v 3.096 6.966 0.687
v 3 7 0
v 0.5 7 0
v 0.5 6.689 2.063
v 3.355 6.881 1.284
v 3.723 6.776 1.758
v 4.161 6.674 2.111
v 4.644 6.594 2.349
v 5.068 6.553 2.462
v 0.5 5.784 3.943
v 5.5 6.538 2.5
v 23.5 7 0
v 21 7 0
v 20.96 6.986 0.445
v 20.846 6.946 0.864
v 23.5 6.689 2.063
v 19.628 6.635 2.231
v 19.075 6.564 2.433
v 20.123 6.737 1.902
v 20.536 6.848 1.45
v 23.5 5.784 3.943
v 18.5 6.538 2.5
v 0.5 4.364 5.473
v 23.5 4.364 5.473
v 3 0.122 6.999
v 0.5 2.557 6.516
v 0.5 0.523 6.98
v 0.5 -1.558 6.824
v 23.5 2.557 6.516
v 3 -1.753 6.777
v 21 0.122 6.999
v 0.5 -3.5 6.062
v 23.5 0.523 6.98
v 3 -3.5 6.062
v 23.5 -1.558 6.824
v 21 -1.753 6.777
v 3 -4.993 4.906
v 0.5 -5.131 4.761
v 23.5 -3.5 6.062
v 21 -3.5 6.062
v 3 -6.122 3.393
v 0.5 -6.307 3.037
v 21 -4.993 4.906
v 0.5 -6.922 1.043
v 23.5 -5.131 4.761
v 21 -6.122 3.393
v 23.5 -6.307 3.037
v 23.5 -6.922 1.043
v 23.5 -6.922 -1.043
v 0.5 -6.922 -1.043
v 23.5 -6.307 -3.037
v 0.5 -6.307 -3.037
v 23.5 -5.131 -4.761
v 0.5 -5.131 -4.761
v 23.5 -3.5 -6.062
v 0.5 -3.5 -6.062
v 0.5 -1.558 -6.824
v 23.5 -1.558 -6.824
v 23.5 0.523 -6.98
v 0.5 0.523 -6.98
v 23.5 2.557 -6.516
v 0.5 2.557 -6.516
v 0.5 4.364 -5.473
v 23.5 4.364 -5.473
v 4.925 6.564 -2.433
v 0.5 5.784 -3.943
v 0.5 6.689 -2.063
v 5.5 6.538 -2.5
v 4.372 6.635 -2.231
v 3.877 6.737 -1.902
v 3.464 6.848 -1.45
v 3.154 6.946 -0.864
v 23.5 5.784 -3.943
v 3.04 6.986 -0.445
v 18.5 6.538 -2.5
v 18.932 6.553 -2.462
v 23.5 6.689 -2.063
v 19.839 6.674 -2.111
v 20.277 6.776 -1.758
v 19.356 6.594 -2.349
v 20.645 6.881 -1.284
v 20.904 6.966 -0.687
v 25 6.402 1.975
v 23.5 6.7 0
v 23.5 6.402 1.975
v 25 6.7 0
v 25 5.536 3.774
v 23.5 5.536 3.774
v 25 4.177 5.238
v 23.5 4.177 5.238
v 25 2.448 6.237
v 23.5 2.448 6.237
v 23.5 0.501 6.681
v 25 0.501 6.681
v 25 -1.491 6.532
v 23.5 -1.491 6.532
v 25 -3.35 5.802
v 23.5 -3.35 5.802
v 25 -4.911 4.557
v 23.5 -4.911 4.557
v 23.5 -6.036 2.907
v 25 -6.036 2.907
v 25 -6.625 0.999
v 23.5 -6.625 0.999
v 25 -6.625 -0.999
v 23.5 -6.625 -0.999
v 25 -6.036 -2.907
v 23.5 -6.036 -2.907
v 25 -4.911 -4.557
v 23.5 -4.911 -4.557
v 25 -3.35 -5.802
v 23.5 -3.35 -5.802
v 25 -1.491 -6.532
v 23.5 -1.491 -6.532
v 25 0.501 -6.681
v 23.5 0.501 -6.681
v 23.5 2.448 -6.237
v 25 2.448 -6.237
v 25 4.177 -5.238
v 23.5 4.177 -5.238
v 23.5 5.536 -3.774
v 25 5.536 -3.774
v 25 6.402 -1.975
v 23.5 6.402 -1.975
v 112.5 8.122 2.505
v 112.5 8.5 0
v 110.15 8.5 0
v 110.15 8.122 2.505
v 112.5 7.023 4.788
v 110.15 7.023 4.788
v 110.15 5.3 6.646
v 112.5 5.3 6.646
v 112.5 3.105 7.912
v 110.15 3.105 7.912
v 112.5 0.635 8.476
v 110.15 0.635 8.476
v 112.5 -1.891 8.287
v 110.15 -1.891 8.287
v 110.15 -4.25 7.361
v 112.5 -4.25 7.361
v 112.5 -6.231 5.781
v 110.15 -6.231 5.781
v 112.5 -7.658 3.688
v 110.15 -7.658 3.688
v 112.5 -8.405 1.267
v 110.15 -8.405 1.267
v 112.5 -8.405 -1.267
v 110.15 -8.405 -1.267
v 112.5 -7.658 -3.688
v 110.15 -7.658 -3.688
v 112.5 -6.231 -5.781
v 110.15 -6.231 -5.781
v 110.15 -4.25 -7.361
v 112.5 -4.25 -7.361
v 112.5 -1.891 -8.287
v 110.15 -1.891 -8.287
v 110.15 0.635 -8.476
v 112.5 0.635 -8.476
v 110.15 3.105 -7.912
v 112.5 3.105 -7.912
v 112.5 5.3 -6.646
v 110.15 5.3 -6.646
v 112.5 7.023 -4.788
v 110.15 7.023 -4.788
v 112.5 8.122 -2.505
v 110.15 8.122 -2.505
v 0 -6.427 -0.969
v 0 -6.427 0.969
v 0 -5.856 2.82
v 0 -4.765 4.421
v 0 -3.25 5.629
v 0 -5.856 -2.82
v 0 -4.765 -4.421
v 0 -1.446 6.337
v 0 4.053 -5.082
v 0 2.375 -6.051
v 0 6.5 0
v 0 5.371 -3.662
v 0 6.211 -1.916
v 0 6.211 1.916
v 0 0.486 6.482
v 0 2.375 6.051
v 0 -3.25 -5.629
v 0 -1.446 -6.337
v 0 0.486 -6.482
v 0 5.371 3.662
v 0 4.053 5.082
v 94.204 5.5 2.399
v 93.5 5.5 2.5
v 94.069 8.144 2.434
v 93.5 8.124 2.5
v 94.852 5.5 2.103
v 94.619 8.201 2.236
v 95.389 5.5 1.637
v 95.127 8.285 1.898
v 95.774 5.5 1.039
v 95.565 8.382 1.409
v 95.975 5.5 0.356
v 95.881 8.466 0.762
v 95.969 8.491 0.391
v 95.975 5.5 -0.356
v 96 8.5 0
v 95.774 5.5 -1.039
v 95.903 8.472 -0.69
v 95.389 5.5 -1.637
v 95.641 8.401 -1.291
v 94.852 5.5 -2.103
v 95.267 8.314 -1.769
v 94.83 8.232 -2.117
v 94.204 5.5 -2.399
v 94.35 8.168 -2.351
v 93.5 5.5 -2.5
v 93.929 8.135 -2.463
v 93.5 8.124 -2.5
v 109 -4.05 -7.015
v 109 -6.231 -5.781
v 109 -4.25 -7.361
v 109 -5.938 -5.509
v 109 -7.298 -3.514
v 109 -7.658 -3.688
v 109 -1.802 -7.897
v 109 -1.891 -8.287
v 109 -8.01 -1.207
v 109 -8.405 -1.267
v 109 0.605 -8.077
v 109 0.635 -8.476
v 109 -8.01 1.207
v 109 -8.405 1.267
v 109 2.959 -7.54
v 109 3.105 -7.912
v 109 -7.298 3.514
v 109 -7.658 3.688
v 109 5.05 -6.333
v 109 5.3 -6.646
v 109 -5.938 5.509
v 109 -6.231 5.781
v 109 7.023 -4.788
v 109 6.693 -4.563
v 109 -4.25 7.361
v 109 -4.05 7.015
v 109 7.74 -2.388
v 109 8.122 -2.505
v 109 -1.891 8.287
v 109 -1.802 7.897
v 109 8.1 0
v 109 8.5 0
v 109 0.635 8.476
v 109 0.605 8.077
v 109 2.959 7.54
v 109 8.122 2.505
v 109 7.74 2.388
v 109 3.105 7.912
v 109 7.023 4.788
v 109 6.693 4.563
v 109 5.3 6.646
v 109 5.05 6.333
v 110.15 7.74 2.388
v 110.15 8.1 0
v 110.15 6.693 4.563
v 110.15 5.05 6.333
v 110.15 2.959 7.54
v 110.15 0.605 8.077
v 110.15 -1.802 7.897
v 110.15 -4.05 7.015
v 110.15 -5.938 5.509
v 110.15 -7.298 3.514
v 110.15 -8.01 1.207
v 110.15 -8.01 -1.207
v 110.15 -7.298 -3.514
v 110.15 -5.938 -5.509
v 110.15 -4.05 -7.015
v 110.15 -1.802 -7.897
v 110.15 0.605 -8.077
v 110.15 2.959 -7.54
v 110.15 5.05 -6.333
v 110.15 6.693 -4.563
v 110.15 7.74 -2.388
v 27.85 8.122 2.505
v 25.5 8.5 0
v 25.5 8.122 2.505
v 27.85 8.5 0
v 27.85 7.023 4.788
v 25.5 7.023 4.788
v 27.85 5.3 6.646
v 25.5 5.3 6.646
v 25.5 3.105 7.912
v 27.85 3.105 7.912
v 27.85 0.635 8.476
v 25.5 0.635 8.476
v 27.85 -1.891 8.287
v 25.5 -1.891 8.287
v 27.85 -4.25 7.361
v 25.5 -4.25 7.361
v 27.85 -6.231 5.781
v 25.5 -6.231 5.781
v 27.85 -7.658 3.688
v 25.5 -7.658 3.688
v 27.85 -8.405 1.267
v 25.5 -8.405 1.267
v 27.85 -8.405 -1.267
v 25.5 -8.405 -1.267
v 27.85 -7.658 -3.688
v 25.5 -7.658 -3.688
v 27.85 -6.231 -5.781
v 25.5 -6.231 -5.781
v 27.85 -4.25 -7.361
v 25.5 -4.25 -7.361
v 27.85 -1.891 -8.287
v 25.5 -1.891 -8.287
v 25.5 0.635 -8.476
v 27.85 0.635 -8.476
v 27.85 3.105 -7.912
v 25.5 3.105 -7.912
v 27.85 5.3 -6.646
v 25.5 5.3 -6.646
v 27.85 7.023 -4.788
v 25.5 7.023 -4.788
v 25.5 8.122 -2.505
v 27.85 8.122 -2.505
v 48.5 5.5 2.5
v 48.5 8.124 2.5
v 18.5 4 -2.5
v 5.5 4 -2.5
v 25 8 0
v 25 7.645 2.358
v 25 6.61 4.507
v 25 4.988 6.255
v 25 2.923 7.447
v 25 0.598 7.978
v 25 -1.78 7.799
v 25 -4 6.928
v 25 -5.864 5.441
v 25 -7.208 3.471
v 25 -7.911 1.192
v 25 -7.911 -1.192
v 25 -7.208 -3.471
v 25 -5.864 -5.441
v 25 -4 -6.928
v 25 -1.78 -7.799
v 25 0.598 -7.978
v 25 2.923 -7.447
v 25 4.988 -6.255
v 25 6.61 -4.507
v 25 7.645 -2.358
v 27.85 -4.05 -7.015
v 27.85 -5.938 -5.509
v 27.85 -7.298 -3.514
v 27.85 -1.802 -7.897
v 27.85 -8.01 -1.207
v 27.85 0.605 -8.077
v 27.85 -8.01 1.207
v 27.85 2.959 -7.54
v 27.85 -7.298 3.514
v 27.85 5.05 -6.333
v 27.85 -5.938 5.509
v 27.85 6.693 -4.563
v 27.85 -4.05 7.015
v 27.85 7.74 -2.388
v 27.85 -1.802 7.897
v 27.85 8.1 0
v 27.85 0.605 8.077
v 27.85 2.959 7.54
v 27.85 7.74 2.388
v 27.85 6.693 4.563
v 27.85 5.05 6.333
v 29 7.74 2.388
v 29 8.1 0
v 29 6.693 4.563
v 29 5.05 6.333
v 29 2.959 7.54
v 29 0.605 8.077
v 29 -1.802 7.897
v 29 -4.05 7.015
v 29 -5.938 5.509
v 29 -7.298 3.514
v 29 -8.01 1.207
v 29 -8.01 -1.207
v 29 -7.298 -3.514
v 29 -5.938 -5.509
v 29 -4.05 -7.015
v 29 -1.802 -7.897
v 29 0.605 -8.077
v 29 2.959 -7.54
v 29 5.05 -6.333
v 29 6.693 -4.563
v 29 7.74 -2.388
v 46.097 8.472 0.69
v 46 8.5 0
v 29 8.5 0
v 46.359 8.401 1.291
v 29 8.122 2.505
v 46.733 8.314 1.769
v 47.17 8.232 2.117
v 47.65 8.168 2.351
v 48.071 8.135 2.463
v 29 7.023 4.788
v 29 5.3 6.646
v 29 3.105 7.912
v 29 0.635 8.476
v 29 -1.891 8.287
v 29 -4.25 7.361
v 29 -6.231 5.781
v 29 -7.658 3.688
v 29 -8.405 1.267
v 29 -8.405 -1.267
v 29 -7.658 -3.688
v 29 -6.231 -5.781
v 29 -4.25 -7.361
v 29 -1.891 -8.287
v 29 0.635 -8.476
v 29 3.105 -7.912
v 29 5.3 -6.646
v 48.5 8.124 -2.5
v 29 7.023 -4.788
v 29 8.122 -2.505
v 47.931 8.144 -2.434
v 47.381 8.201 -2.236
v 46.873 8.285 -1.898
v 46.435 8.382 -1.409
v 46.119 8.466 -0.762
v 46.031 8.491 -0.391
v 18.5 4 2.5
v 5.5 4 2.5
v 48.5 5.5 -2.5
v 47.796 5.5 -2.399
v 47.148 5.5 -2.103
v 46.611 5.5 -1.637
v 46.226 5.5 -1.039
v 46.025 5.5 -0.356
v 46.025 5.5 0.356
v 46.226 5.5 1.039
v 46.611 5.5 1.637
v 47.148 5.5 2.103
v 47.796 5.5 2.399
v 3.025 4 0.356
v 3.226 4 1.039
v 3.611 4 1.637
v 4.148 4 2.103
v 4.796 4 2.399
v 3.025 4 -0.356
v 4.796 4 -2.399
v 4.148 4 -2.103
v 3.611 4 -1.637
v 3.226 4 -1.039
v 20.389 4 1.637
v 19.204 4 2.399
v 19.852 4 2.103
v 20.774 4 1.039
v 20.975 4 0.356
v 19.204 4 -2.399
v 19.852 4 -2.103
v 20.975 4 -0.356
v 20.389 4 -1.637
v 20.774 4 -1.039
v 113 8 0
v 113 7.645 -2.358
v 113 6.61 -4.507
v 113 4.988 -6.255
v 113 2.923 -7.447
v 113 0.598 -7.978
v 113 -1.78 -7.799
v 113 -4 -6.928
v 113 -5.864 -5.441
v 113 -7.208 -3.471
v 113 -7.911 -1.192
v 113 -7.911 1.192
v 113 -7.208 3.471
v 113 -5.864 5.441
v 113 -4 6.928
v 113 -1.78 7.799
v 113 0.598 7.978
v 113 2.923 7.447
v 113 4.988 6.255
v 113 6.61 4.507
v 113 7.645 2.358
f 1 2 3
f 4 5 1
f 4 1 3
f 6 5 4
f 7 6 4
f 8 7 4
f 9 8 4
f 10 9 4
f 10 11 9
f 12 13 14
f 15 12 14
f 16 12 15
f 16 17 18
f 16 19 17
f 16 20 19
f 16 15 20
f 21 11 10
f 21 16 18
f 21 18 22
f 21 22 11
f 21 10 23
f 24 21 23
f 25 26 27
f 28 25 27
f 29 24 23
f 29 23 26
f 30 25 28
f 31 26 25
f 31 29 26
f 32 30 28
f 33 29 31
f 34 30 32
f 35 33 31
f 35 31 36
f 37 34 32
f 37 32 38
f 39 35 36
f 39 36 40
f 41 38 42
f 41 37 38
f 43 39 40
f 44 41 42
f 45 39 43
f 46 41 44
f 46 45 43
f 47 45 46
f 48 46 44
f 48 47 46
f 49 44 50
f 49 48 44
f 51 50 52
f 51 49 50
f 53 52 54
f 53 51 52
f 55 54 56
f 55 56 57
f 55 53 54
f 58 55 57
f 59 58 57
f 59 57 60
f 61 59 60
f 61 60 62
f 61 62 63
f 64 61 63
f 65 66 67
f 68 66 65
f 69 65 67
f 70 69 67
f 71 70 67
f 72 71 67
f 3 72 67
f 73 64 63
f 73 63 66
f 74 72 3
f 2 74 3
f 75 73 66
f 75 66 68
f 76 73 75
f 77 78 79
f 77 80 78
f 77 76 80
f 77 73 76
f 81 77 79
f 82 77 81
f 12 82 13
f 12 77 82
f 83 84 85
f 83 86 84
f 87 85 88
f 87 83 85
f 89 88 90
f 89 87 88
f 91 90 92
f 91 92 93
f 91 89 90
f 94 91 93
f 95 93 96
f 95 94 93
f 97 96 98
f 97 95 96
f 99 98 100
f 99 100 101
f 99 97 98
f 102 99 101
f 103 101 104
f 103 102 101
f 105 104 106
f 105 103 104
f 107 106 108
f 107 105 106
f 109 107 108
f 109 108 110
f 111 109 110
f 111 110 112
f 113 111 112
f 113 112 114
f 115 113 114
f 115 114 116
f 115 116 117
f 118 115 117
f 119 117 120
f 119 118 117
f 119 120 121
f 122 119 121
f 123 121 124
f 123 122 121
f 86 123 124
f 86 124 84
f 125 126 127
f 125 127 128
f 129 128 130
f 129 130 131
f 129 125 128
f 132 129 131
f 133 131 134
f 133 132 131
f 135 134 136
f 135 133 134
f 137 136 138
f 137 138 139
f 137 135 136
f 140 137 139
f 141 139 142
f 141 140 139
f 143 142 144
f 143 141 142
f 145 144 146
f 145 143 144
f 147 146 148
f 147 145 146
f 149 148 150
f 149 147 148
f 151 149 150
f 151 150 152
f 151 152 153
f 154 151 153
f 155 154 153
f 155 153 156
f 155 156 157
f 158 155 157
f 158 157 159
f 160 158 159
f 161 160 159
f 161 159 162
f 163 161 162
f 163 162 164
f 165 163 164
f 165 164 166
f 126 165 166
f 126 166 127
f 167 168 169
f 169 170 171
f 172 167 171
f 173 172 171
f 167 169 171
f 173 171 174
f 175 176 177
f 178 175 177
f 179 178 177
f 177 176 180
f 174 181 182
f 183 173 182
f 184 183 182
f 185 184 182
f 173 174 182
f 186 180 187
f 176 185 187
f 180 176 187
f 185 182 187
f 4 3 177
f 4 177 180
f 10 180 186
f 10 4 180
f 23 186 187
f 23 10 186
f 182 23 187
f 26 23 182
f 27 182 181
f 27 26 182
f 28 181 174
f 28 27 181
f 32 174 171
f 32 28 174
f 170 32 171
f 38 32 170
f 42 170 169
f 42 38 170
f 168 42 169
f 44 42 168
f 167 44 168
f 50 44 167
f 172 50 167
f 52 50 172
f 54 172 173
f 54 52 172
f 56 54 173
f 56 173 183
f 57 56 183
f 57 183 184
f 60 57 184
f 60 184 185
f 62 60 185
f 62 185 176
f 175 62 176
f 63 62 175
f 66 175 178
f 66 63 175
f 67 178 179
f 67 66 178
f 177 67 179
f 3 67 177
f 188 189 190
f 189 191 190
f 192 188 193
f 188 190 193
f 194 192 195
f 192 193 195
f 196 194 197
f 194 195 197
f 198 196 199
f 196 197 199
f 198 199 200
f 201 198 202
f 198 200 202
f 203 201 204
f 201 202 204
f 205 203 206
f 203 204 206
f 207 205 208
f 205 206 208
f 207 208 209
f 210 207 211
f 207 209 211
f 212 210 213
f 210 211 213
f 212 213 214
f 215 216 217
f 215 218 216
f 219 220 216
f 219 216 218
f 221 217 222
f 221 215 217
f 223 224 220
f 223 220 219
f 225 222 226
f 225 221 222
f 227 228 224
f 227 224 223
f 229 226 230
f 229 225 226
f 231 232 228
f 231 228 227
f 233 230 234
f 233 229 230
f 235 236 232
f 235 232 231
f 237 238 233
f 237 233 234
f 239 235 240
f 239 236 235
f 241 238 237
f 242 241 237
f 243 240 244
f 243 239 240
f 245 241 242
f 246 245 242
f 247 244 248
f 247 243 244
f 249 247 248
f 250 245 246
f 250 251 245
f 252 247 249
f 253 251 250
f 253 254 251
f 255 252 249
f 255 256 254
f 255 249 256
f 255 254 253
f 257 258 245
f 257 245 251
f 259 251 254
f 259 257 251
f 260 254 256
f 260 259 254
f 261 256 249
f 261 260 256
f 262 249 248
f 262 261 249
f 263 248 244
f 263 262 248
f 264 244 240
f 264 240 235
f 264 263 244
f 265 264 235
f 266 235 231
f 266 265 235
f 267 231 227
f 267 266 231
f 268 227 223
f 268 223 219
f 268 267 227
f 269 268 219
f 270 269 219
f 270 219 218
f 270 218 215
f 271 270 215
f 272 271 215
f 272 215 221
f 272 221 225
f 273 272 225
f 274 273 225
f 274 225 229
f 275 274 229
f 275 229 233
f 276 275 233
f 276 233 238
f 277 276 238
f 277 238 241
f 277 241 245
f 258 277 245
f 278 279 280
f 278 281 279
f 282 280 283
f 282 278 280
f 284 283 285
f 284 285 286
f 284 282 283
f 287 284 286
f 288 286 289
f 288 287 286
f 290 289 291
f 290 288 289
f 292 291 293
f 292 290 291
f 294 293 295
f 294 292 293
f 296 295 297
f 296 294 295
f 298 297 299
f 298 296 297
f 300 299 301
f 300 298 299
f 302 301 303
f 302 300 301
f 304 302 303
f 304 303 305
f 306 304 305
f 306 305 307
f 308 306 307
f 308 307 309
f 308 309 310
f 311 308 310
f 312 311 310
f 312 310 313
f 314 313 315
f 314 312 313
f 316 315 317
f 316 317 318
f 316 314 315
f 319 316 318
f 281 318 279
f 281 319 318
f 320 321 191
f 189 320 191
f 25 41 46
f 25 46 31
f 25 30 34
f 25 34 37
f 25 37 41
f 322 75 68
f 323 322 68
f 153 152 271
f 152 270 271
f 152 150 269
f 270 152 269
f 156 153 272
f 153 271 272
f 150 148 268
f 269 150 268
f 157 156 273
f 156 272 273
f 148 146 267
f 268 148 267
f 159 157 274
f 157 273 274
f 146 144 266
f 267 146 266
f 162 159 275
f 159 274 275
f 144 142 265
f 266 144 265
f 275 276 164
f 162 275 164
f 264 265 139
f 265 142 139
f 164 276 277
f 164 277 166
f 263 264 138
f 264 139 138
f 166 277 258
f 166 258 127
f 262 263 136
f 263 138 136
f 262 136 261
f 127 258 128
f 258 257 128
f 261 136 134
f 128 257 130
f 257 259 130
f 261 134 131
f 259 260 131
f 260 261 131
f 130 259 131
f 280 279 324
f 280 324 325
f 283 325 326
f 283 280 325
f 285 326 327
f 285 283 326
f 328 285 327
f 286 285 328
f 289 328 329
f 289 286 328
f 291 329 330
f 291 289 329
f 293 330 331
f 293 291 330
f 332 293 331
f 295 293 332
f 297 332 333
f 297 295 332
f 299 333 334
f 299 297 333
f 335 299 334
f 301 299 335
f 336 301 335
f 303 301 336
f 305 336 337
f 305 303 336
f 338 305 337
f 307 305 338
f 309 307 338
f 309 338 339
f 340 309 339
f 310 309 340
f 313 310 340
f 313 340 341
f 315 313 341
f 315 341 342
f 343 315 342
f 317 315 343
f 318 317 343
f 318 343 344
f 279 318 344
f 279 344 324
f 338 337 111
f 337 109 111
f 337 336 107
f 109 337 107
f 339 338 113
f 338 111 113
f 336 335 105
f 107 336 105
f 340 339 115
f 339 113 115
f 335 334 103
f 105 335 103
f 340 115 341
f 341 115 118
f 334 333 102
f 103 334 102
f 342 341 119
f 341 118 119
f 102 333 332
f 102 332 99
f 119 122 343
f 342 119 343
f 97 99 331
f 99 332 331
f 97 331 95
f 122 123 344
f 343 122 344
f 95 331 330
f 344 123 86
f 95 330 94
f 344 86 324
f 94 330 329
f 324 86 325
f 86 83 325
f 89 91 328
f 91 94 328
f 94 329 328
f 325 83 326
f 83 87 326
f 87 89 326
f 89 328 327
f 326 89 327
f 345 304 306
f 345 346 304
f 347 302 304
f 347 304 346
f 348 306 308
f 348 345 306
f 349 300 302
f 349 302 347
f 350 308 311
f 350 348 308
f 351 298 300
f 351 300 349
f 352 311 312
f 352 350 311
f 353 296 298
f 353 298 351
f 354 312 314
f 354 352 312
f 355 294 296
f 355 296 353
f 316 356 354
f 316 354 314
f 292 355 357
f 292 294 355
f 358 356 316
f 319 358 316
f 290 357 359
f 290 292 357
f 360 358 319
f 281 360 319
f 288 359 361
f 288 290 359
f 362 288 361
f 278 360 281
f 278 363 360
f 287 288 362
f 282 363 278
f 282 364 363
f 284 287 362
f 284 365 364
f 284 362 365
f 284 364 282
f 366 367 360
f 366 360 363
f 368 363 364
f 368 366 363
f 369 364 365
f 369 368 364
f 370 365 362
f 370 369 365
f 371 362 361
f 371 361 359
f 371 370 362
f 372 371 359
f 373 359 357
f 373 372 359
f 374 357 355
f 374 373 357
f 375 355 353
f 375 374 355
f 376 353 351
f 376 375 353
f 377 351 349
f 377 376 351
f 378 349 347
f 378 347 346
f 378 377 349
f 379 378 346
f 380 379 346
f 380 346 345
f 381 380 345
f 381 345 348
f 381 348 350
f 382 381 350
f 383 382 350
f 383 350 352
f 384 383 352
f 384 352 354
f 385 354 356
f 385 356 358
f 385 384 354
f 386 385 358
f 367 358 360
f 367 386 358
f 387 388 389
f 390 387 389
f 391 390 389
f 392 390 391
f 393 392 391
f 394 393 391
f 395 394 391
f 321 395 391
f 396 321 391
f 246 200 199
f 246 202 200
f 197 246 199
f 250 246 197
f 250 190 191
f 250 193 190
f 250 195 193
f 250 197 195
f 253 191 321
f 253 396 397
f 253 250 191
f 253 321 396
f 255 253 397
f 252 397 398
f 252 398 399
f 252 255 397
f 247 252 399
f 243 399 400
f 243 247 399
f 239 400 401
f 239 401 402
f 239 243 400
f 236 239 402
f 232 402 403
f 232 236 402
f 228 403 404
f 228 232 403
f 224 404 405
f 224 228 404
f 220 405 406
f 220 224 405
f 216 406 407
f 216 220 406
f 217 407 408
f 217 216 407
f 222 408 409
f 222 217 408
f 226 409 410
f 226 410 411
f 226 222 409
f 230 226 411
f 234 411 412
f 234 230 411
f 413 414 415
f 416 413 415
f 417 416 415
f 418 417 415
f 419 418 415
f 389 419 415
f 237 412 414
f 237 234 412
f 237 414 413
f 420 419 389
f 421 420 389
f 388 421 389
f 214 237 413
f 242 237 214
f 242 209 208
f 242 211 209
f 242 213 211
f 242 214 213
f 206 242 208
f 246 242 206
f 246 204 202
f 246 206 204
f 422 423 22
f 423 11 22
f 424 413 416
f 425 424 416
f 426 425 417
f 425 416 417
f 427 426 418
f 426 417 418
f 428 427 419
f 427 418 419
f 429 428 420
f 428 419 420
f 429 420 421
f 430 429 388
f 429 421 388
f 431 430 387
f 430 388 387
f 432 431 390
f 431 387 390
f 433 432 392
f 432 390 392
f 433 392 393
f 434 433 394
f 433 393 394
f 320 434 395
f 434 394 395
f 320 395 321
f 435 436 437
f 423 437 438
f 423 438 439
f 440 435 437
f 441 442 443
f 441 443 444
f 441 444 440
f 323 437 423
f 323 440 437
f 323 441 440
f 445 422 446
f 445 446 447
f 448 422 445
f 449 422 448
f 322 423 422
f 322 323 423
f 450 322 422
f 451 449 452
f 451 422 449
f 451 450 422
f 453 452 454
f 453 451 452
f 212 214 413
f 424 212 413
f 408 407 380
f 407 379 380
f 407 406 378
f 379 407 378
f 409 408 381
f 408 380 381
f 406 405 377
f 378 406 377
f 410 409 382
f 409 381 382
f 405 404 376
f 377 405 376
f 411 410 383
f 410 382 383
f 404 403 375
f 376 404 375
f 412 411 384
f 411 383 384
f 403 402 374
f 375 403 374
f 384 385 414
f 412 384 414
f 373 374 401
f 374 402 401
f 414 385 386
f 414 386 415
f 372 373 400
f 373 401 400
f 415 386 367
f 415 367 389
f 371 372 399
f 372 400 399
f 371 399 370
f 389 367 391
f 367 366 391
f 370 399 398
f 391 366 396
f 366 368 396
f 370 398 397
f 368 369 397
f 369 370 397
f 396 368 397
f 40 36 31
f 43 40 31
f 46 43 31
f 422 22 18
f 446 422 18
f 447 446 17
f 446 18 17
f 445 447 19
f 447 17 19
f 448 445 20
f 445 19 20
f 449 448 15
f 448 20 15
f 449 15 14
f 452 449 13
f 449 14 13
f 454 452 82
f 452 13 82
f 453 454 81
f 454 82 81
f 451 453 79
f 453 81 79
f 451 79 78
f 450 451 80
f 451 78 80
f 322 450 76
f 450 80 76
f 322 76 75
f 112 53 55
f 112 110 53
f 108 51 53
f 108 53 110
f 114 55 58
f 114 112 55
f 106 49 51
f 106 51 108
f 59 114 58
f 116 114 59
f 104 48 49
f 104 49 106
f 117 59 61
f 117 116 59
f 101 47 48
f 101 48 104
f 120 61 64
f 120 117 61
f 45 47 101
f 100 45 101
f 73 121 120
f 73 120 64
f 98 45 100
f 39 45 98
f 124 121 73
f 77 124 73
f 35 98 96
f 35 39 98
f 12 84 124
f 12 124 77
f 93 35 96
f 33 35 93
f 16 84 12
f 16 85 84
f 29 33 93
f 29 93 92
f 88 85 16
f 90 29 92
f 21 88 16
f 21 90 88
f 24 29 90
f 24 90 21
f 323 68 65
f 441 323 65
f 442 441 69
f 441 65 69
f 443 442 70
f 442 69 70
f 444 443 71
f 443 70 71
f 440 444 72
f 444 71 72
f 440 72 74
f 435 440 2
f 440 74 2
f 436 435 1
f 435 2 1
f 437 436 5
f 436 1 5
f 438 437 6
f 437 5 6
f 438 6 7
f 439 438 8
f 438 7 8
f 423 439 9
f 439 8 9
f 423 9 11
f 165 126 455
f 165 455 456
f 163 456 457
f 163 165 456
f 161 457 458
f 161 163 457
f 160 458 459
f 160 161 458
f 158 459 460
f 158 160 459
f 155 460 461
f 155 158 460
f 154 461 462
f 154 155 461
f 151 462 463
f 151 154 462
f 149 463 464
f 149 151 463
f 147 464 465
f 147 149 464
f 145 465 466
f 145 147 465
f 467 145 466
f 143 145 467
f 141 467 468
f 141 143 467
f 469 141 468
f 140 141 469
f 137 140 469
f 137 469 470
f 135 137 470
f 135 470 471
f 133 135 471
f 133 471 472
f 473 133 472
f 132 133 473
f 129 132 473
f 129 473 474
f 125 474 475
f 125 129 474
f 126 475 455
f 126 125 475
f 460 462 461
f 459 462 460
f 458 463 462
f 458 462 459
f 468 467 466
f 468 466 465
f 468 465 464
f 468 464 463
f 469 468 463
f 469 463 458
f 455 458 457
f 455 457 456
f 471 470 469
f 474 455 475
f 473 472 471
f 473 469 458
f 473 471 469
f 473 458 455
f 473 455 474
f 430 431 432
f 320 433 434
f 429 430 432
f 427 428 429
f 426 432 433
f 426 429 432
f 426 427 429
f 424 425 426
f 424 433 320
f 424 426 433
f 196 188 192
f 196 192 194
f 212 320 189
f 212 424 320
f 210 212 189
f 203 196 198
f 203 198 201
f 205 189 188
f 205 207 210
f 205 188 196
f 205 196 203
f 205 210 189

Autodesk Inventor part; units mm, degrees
sketch "Sketch_1" plane through (0, 0, 0) normal (0, 0, 1) x (1, 0, 0)
  line L0 (113, 0) -> (0, 0)
  line L1 (0, 0) -> (0, 6.5)
  line L2 (0, 6.5) -> (0.5, 7)
  line L3 (0.5, 7) -> (25, 7)
  line L4 (25, 7) -> (25, 8)
  line L5 (25, 8) -> (25.5, 8.5)
  line L6 (25.5, 8.5) -> (112.5, 8.5)
  line L7 (112.5, 8.5) -> (113, 8)
  line L8 (113, 8) -> (113, 0)
  line L9 (113, 0) -> (0, 0)
revolve "Revolution1" add sketch "Sketch_1" angle 360 about axis through (113, 0, 0) along (1, 0, 0)
sketch "Sketch_2" plane through (0, 0, 0) normal (0, 0, 1) x (1, 0, 0)
  line L0 (50, 0) -> (-50, 0)
  line L1 (23.5, 21) -> (23.5, 6.7)
  line L2 (23.5, 6.7) -> (25, 6.7)
  line L3 (25, 6.7) -> (25, 21)
  line L4 (25, 21) -> (23.5, 21)
revolve "Revolution2" cut sketch "Sketch_2" angle 360 about axis through (50, 0, 0) along (1, 0, 0)
sketch "Sketch_15" plane through (0, 0, 0) normal (0, 0, 1) x (1, 0, 0)
  line L0 (50, 0) -> (-50, 0)
  line L1 (27.85, 25.1) -> (27.85, 8.1)
  line L2 (27.85, 8.1) -> (29, 8.1)
  line L3 (29, 8.1) -> (29, 25.1)
  line L4 (29, 25.1) -> (27.85, 25.1)
revolve "Revolution3" cut sketch "Sketch_15" angle 360 about axis through (50, 0, 0) along (1, 0, 0)
sketch "Sketch_16" plane through (0, 0, 0) normal (0, 0, 1) x (1, 0, 0)
  line L0 (113, 0) -> (-50, 0)
  line L1 (109, 25.1) -> (109, 8.1)
  line L2 (109, 8.1) -> (110.15, 8.1)
  line L3 (110.15, 8.1) -> (110.15, 25.1)
  line L4 (110.15, 25.1) -> (109, 25.1)
revolve "Revolution4" cut sketch "Sketch_16" angle 360 about axis through (113, 0, 0) along (1, 0, 0)
sketch "Sketch_20" plane through (0, 8.5, 0) normal (0, 1, 0) x (1, 0, 0)
  arc A0 (48.5, 2.5) -> (48.5, -2.5) centre (48.5, 0) ccw
  line L0 (48.5, -2.5) -> (93.5, -2.5)
  arc A1 (93.5, -2.5) -> (93.5, 2.5) centre (93.5, 0) ccw
  line L1 (93.5, 2.5) -> (48.5, 2.5)
extrude "Extrusion1" cut sketch "Sketch_20" against normal blind 3
sketch "Sketch_21" plane through (0, 7, 0) normal (0, 1, 0) x (1, 0, 0)
  arc A0 (5.5, 2.5) -> (5.5, -2.5) centre (5.5, 0) ccw
  line L0 (5.5, -2.5) -> (18.5, -2.5)
  arc A1 (18.5, -2.5) -> (18.5, 2.5) centre (18.5, 0) ccw
  line L1 (18.5, 2.5) -> (5.5, 2.5)
extrude "Extrusion2" cut sketch "Sketch_21" against normal blind 3
sketch "Sketch_63" plane through (3, 0, 0) normal (1, 0, 0) x (0, 0, -1)
  line L0 (-13.0622, 8.6244) -> (0.9378, -15.6244)
  line L1 (0.9378, -15.6244) -> (1.8038, -15.1244)
  line L2 (1.8038, -15.1244) -> (-12.1962, 9.1244)
  line L3 (-12.1962, 9.1244) -> (-13.0622, 8.6244)
extrude "Extrusion3" cut sketch "Sketch_63" along normal blind 18
ref_plane "to_c_ring_2_XY" through (28.425, 0, 0) normal (1, 0, 0) x (0, 0, 1)
ref_plane "to_c_ring_2_YZ" through (28.425, 0, 0) normal (0, 0, 1) x (0, -1, 0)
ref_plane "to_c_ring_2_ZX" through (28.425, 0, 0) normal (0, -1, 0) x (1, 0, 0)
ref_plane "to_c_ring_3_XY" through (109.575, 0, 0) normal (1, 0, 0) x (0, 0, 1)
ref_plane "to_c_ring_3_YZ" through (109.575, 0, 0) normal (0, 0, 1) x (0, -1, 0)
ref_plane "to_c_ring_3_ZX" through (109.575, 0, 0) normal (0, -1, 0) x (1, 0, 0)
properties part number "KZBN17-113-P14-LA25-TC4-TB4-KB21-HB50-ZA3-HA18-AA120_b" material "Stainless Steel"
